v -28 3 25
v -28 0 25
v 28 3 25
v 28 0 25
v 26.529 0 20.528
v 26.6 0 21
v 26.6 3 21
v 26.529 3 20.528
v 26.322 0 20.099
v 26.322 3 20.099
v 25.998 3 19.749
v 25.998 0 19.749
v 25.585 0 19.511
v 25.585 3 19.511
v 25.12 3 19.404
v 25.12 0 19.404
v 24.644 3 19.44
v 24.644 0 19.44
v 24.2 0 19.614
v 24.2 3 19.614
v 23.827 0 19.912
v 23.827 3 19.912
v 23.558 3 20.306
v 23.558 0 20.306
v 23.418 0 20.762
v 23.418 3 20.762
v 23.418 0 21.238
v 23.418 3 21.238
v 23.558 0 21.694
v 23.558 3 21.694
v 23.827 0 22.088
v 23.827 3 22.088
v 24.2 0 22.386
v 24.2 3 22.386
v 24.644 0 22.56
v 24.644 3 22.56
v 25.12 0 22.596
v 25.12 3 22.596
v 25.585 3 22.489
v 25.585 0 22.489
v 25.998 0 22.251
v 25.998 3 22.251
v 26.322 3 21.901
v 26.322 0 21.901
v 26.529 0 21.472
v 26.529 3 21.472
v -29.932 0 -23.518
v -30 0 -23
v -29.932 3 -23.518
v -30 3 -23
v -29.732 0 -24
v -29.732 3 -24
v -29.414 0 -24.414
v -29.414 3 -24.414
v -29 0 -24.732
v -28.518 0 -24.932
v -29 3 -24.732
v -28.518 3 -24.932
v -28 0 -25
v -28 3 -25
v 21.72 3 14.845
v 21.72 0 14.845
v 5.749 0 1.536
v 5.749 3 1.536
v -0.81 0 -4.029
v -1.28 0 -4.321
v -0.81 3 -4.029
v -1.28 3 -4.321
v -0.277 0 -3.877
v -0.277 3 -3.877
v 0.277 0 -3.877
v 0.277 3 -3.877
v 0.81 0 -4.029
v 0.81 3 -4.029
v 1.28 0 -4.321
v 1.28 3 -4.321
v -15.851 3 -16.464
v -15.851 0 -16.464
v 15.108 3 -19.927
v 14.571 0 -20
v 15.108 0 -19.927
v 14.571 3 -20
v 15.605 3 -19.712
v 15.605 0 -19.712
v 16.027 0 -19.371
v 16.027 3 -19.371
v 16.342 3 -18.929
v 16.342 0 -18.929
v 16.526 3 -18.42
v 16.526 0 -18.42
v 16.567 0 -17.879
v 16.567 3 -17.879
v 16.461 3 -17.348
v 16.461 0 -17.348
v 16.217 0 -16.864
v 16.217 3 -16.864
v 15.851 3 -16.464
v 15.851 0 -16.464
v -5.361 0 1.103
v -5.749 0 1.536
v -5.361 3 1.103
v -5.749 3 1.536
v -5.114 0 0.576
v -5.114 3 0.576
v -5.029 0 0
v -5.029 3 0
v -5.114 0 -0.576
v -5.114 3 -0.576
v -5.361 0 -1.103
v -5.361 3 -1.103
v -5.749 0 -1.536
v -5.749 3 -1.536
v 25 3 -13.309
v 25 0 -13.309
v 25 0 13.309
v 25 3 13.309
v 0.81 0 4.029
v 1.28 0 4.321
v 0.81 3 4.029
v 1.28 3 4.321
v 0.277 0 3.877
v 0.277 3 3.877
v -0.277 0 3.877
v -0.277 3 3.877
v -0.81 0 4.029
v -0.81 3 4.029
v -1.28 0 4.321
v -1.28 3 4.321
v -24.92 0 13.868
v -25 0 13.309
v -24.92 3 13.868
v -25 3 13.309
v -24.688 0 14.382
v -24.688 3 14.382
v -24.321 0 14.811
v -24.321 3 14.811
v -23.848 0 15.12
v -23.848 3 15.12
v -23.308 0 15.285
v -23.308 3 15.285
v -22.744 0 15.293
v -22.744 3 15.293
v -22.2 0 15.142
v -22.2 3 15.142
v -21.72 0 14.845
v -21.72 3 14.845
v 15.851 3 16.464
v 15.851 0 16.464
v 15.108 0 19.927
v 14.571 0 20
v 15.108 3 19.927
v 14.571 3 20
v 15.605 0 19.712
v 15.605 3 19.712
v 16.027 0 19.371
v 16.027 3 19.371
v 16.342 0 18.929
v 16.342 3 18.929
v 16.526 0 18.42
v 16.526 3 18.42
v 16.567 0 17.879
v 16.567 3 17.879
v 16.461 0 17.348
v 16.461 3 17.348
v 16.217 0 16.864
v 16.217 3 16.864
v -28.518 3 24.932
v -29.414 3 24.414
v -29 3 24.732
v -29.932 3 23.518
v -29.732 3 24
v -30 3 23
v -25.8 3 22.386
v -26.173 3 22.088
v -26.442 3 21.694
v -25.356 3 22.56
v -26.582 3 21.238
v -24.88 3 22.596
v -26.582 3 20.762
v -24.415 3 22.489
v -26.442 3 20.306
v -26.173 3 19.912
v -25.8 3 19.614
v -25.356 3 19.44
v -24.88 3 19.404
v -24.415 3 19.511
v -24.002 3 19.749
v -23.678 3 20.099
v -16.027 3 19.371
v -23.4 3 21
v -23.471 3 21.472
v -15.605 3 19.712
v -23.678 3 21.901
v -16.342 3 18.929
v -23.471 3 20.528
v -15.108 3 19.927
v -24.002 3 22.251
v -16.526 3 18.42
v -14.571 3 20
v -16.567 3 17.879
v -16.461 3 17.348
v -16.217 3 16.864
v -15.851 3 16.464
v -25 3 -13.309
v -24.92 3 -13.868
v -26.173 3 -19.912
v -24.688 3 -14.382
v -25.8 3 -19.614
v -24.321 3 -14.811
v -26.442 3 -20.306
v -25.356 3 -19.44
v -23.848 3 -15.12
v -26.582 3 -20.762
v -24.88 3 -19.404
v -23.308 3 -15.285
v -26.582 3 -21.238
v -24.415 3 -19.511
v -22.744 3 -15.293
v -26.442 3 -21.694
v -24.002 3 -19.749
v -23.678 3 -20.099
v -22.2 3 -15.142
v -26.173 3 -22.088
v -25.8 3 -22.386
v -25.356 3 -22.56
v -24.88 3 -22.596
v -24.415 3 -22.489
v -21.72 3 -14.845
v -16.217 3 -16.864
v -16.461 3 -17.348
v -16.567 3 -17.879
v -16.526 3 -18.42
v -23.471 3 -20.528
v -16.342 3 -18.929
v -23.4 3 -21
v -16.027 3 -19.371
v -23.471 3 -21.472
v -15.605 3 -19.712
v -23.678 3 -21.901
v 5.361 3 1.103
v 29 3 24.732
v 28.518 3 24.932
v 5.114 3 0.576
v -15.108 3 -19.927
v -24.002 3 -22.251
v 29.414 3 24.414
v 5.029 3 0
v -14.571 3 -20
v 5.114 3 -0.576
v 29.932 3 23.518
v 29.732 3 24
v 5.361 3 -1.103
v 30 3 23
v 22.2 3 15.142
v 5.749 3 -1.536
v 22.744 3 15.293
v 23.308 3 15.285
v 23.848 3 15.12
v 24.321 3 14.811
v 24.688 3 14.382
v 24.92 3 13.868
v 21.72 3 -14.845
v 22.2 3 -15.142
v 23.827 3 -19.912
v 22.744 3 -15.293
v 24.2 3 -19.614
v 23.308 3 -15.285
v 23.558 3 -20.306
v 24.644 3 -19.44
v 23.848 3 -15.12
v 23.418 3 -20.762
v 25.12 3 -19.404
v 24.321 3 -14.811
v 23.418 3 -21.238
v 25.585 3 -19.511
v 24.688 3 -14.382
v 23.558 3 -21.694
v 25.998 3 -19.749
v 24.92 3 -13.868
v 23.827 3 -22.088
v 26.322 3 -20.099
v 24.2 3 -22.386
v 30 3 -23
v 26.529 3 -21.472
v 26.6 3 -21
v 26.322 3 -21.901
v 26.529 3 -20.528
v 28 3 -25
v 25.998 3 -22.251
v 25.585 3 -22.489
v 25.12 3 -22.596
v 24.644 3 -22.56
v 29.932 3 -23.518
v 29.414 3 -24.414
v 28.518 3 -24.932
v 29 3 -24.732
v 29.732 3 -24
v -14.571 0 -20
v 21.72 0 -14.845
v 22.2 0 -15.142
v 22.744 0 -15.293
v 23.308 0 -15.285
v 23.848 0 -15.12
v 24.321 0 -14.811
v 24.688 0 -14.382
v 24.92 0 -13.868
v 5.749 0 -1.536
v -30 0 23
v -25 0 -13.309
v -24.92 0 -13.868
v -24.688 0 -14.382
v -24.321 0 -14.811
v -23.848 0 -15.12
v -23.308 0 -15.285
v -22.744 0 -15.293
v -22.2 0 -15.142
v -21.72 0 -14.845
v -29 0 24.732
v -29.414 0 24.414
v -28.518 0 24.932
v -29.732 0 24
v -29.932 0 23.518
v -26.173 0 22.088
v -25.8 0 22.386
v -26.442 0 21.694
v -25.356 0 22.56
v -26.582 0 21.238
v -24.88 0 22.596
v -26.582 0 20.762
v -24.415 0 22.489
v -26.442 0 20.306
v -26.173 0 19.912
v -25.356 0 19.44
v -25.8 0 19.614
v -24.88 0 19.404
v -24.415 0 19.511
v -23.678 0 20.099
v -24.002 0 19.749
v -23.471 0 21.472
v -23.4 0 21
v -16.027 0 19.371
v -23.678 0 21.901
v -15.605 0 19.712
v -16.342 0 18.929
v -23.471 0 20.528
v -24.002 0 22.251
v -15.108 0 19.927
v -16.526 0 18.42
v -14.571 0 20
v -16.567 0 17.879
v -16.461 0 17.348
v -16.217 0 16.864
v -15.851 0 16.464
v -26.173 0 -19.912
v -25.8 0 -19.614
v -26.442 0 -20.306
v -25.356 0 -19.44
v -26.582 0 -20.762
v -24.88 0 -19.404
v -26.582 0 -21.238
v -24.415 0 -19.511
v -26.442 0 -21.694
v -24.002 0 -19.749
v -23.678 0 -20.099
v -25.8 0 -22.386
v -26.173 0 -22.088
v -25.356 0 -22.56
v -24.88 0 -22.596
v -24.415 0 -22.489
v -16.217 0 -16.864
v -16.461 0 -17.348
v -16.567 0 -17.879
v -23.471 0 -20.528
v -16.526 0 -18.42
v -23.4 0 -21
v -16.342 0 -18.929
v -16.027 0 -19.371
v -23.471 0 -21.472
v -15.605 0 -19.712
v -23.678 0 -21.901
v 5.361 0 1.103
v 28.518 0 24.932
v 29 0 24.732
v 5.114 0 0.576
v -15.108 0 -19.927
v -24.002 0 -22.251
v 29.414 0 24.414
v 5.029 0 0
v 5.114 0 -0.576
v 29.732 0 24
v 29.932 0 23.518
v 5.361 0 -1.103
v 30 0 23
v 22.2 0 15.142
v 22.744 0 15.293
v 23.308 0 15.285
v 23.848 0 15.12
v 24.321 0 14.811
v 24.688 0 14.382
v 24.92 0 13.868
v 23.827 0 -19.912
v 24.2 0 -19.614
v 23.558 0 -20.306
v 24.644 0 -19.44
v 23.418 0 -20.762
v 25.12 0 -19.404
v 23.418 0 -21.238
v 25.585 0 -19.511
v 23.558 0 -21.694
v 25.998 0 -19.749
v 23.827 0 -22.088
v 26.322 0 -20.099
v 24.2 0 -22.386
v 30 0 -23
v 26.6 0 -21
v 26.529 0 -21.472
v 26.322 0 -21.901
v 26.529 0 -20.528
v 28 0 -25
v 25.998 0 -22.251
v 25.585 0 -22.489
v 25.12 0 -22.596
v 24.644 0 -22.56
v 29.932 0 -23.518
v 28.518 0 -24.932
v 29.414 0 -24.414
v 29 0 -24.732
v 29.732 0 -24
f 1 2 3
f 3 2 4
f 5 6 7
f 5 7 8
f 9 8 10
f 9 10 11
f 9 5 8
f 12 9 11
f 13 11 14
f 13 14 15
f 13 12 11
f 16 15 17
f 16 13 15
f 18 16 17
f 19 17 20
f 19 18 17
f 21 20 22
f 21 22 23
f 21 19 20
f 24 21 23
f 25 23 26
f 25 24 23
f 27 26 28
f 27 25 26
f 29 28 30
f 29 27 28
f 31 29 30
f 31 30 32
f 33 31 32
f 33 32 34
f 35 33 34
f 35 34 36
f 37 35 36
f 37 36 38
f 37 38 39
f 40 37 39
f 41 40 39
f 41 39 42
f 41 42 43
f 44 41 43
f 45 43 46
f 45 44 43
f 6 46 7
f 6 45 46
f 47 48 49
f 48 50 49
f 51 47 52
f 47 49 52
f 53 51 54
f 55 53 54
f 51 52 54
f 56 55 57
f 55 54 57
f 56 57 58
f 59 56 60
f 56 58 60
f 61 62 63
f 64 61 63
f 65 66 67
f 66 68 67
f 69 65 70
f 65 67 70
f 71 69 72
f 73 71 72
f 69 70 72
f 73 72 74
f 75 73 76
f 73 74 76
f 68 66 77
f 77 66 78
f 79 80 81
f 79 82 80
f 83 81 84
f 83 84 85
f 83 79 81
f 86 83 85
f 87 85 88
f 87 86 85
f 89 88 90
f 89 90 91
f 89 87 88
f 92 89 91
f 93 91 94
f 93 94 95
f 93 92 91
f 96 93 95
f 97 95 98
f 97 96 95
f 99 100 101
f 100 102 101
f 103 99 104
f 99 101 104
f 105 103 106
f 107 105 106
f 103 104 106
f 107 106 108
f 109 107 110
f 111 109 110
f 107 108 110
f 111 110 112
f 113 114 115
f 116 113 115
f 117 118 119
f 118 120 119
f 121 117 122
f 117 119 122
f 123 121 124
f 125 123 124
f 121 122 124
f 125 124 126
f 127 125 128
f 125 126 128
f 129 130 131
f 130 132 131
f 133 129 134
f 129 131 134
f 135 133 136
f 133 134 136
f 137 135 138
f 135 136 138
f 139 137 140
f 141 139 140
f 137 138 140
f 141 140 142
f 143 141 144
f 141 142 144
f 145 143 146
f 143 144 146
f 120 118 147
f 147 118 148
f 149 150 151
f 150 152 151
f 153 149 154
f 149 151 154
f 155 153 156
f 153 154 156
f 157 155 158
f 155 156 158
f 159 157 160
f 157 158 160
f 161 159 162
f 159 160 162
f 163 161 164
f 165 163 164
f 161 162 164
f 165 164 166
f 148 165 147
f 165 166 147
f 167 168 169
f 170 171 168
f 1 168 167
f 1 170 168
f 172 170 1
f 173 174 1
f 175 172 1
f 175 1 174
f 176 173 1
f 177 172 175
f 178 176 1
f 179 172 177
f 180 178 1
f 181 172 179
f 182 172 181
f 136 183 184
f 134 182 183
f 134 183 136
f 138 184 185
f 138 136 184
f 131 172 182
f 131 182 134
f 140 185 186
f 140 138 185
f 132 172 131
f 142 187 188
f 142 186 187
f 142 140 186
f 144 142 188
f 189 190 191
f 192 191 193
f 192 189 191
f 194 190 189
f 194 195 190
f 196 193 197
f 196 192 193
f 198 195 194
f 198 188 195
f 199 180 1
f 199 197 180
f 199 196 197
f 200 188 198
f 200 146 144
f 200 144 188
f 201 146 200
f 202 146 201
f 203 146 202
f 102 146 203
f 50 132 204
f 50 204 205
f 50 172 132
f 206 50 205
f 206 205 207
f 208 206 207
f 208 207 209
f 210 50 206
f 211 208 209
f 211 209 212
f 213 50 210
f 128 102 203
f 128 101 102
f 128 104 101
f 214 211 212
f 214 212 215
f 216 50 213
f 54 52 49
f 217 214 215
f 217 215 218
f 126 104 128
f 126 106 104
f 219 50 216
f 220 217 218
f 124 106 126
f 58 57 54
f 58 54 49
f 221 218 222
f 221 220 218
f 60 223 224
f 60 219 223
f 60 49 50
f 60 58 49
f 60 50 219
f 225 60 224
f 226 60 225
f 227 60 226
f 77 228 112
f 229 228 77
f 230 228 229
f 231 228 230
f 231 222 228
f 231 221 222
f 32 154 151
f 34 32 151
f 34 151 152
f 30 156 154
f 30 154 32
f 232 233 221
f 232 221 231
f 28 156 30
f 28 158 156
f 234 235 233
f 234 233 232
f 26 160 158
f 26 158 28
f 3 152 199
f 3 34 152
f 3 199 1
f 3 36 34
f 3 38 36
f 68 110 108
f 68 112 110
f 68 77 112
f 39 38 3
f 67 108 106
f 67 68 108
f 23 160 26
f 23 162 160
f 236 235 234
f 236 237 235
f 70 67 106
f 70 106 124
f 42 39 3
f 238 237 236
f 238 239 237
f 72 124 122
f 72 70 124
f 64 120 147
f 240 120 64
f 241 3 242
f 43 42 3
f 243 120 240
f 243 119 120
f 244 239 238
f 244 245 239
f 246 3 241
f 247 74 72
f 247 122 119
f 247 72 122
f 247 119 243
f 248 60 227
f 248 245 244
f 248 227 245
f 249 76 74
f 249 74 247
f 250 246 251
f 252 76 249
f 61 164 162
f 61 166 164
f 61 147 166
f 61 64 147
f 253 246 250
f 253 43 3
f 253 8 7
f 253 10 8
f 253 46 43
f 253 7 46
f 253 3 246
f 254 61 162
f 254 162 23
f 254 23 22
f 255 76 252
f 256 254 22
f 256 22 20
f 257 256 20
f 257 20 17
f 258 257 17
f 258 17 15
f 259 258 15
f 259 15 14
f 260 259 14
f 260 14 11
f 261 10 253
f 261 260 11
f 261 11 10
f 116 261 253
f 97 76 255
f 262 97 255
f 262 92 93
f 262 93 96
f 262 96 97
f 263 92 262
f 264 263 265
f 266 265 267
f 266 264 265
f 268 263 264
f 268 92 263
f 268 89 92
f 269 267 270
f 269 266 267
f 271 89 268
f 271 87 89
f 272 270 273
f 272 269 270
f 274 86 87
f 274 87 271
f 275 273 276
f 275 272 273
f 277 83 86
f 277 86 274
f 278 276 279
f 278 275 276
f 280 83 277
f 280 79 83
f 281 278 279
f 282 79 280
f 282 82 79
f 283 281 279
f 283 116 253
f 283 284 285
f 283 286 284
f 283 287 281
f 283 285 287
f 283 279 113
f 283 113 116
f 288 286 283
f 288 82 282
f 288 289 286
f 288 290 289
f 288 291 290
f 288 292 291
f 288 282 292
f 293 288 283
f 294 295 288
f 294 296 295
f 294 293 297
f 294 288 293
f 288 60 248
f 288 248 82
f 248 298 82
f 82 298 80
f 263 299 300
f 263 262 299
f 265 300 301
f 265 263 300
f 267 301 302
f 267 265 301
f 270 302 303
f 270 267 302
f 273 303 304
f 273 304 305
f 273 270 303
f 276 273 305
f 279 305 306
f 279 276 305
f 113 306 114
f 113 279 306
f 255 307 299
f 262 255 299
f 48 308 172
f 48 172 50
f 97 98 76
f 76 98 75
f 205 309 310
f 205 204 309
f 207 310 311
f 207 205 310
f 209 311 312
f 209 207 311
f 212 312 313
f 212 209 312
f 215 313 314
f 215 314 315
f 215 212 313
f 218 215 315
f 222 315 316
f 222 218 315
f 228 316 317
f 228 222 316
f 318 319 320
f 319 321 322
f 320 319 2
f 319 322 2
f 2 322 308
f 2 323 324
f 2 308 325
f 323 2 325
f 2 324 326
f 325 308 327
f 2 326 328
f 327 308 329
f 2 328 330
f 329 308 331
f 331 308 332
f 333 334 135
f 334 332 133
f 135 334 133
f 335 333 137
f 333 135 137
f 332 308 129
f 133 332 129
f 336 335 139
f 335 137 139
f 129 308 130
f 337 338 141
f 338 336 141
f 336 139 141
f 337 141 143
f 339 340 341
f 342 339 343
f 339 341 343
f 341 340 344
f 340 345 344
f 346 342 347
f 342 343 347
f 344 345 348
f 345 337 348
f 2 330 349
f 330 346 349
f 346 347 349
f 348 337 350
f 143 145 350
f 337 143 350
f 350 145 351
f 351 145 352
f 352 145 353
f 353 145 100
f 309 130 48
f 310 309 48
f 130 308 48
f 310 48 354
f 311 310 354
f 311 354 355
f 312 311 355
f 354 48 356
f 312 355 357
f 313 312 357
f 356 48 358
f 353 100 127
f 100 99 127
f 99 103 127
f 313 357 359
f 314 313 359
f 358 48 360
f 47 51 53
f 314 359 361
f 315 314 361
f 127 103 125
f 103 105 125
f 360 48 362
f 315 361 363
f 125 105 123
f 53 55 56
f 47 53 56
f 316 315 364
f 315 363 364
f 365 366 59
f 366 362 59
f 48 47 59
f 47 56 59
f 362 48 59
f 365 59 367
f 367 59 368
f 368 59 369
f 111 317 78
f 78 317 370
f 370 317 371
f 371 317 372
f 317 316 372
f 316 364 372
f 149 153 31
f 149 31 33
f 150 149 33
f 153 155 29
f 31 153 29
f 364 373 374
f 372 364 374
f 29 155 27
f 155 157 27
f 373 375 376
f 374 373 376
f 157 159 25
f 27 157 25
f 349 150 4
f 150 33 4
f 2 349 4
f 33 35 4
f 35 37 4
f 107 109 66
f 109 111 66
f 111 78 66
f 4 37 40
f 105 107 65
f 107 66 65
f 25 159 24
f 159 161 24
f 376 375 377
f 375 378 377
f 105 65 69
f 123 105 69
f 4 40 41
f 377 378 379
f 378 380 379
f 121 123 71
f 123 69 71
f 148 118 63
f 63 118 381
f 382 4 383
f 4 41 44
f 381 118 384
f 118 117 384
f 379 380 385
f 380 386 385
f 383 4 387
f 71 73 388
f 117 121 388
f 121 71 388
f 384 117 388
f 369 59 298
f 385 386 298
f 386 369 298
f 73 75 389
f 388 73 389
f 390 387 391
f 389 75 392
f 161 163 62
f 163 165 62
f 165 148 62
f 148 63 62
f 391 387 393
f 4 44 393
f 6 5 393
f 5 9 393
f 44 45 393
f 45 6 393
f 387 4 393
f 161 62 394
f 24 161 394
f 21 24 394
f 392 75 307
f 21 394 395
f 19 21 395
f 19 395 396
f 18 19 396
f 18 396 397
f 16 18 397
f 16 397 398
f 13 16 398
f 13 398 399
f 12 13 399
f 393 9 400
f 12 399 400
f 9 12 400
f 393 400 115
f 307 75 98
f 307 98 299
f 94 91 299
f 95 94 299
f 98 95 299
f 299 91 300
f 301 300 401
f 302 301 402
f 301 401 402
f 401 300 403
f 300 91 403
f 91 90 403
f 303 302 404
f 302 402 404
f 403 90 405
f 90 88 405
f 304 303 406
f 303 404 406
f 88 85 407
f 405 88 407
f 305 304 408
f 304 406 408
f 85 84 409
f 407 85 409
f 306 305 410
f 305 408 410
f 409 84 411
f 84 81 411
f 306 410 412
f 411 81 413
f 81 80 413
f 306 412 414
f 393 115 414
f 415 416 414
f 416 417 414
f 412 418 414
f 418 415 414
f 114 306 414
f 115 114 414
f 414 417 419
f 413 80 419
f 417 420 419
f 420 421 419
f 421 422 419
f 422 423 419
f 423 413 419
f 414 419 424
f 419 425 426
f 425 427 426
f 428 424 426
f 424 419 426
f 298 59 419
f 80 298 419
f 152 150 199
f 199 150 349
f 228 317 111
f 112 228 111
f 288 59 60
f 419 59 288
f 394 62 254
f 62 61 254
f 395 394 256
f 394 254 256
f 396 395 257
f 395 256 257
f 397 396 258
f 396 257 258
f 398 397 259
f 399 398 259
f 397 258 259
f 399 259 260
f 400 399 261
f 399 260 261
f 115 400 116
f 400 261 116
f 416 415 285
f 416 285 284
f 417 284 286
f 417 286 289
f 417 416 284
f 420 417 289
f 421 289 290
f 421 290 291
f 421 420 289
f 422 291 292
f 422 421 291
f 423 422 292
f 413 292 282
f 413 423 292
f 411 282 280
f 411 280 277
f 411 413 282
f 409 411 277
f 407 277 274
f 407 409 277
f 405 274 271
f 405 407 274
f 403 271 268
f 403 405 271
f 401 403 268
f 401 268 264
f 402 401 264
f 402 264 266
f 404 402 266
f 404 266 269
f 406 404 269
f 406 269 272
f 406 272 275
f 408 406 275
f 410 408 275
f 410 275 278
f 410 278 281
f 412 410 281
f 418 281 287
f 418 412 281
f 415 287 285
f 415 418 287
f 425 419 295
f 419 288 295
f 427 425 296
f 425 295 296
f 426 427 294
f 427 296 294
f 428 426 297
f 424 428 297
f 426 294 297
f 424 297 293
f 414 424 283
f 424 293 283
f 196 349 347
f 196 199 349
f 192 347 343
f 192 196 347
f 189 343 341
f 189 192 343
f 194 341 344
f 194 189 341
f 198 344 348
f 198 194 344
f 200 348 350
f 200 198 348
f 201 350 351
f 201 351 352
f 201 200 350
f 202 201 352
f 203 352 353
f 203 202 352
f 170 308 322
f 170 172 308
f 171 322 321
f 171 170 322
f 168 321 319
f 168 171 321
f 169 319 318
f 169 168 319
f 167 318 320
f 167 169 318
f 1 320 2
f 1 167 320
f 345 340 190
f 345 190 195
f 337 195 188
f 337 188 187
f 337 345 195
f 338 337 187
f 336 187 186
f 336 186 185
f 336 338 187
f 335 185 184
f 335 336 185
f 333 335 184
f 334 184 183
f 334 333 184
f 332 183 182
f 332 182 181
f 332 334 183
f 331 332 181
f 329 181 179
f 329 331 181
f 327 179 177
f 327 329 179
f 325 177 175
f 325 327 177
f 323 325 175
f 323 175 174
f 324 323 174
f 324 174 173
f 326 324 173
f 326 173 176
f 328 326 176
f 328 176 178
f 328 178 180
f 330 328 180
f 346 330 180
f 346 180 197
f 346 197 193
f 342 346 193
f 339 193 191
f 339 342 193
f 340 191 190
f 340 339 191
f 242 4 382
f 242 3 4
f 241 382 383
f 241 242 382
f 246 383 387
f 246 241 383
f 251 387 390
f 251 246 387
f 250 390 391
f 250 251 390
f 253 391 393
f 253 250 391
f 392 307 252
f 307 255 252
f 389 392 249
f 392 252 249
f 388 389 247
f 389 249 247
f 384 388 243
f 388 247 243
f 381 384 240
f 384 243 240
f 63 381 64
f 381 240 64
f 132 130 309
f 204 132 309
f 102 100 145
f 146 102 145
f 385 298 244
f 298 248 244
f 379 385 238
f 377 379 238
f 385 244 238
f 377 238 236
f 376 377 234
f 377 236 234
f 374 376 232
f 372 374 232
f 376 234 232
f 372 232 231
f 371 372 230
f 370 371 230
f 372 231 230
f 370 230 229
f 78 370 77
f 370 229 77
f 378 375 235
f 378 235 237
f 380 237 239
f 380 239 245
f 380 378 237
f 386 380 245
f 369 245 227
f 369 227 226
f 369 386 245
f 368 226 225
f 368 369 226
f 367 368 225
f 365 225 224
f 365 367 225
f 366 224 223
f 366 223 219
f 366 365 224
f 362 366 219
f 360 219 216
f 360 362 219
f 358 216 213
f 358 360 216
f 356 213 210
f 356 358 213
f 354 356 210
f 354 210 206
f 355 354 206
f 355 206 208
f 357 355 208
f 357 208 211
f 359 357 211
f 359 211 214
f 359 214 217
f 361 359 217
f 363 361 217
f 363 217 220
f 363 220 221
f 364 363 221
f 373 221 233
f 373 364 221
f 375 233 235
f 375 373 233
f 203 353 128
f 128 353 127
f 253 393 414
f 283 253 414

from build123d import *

# Parameters (mm, degrees)
SKETCH_1_W      = 60
SKETCH_1_H      = 50
SKETCH_1_R      = 1.6
EXTRUDE_1_DEPTH = 3
FILLET_1_R      = 2
FILLET_2_R      = 2


with BuildPart() as part:
    # 草图1 → 凸台-拉伸1 (new body)
    with BuildSketch(Plane(origin=(0, 0, 0), x_dir=(1, 0, 0), z_dir=(0, 1, 0))):
        Rectangle(SKETCH_1_W, SKETCH_1_H)
        with Locations((-25, 21)):
            Circle(SKETCH_1_R, mode=Mode.SUBTRACT)
        with Locations((25, 21)):
            Circle(SKETCH_1_R, mode=Mode.SUBTRACT)
        with Locations((25, -21)):
            Circle(SKETCH_1_R, mode=Mode.SUBTRACT)
        with Locations((-25, -21)):
            Circle(SKETCH_1_R, mode=Mode.SUBTRACT)
        Polygon((-25, 17.579062635), (-3.905124838, 0), (-25, -17.579062635), align=None, mode=Mode.SUBTRACT)
        Polygon((25, 17.579062635), (25, -17.579062635), (3.905124838, 0), align=None, mode=Mode.SUBTRACT)
        Polygon((-20.094875162, -20), (0, -3.254270698), (20.094875162, -20), align=None, mode=Mode.SUBTRACT)
        Polygon((20.094875162, 20), (0, 3.254270698), (-20.094875162, 20), align=None, mode=Mode.SUBTRACT)
    extrude(amount=EXTRUDE_1_DEPTH)

    # 圆角1
    fillet_1_edges = [part.edges().sort_by_distance(p)[0] for p in [
        (30, 1.5, 25),
        (-30, 1.5, 25),
        (-30, 1.5, -25),
        (30, 1.5, -25),
    ]]
    fillet(fillet_1_edges, radius=FILLET_1_R)

    # 圆角2
    fillet_2_edges = [part.edges().sort_by_distance(p)[0] for p in [
        (-25, 1.5, -17.579062635),
        (-25, 1.5, 17.579062635),
        (-3.905124838, 1.5, 0),
        (-20.094875162, 1.5, 20),
        (20.094875162, 1.5, 20),
        (0, 1.5, 3.254270698),
        (3.905124838, 1.5, 0),
        (25, 1.5, 17.579062635),
        (25, 1.5, -17.579062635),
        (20.094875162, 1.5, -20),
        (-20.094875162, 1.5, -20),
        (0, 1.5, -3.254270698),
    ]]
    fillet(fillet_2_edges, radius=FILLET_2_R)


solid = part.part
